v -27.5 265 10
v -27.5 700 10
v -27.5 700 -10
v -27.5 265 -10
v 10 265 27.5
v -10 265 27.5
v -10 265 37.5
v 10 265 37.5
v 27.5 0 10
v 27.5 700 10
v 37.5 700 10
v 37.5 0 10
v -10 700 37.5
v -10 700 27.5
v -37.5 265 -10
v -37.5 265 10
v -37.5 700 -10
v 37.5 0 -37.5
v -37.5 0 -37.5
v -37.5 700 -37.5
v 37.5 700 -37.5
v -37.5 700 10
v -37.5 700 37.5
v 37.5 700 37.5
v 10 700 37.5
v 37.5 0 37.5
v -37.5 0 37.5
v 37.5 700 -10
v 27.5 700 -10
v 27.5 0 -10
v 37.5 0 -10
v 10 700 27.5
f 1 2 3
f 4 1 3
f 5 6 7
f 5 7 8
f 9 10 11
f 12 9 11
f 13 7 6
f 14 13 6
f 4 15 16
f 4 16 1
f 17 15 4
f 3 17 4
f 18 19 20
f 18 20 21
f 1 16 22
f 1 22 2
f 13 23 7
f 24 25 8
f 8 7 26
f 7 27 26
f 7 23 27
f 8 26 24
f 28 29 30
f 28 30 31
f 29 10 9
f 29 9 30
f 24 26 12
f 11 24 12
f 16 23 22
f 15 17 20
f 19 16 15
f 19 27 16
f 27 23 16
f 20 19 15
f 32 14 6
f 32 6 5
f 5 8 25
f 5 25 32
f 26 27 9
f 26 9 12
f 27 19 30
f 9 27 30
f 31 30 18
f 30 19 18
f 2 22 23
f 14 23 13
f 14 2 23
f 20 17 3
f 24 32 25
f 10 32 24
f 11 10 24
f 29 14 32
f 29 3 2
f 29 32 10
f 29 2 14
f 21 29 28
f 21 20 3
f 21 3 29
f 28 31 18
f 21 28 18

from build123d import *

# Parameters (mm, degrees)
SKETCH1_W           = 75
SKETCH1_H           = 75
BOSS_EXTRUDE1_DEPTH = 700
SKETCH2_2_W         = 20
SKETCH2_2_H         = 10
SKETCH2_2_W_2       = 10
SKETCH2_2_H_2       = 20
CUT_EXTRUDE2_DEPTH  = 435
SKETCH2_4_W         = 10
SKETCH2_4_H         = 20
CUT_EXTRUDE3_DEPTH  = 701


with BuildPart() as part:
    # Sketch1 → Boss-Extrude1 (new body)
    with BuildSketch(Plane(origin=(0, 0, 0), x_dir=(1, 0, 0), z_dir=(0, 1, 0))):
        Rectangle(SKETCH1_W, SKETCH1_H)
    extrude(amount=BOSS_EXTRUDE1_DEPTH)

    # Sketch2_2 → Cut-Extrude2 (cut)
    with BuildSketch(Plane(origin=(0, 700, 0), x_dir=(1, 0, 0), z_dir=(0, 1, 0))):
        with Locations((0, -32.5)):
            Rectangle(SKETCH2_2_W, SKETCH2_2_H)
        with Locations((-32.5, 0)):
            Rectangle(SKETCH2_2_W_2, SKETCH2_2_H_2)
    extrude(amount=-CUT_EXTRUDE2_DEPTH, mode=Mode.SUBTRACT)

    # Sketch2_4 → Cut-Extrude3 (cut, through all)
    with BuildSketch(Plane(origin=(0, 700, 0), x_dir=(1, 0, 0), z_dir=(0, 1, 0))):
        with Locations((32.5, 0)):
            Rectangle(SKETCH2_4_W, SKETCH2_4_H)
    extrude(amount=-CUT_EXTRUDE3_DEPTH, mode=Mode.SUBTRACT)


solid = part.part
